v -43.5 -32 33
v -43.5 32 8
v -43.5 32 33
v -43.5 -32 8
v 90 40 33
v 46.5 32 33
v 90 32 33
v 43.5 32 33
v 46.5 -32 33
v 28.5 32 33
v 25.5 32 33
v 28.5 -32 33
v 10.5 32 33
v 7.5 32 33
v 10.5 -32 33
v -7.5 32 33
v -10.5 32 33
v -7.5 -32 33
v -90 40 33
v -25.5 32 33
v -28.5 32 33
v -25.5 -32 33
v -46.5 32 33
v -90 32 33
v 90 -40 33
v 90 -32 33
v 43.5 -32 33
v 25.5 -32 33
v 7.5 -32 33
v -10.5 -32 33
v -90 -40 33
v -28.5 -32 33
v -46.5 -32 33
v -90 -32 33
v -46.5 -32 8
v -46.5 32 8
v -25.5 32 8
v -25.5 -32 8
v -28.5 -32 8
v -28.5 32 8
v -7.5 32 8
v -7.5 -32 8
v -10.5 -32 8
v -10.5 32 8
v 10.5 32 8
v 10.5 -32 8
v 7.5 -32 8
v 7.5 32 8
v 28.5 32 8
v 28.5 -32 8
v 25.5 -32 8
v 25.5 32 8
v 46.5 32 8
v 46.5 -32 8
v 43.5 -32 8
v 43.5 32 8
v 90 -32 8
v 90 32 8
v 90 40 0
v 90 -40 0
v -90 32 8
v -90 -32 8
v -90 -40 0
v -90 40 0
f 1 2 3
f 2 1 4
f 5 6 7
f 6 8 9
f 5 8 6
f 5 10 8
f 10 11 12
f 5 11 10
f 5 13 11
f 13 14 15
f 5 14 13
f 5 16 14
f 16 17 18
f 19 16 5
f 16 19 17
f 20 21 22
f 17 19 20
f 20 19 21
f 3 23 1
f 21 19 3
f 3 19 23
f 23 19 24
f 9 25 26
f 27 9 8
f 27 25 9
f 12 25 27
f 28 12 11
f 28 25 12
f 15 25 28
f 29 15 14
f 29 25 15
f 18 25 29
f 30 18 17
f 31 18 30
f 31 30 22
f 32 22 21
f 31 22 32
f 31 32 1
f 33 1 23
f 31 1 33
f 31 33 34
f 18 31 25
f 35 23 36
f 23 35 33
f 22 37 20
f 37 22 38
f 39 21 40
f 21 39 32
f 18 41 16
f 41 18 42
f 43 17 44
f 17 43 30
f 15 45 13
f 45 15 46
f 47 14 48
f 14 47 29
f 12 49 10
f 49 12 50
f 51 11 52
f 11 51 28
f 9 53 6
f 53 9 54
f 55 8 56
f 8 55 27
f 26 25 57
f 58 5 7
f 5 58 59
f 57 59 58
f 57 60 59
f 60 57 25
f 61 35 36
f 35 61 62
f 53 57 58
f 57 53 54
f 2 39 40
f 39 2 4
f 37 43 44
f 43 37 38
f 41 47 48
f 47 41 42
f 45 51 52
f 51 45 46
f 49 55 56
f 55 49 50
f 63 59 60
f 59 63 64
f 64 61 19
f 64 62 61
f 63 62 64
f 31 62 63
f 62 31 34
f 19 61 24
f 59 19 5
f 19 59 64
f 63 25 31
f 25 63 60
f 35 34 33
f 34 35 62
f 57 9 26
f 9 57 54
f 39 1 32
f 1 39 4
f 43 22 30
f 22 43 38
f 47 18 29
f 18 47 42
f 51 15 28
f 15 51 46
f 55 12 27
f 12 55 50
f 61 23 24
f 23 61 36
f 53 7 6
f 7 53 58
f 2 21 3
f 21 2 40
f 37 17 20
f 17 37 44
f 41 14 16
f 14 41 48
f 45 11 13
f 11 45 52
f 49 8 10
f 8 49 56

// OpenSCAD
$fn = 32;

// ----------------------------------------------------------------------
// Rib frame 180 x 80 x 33
// 6 ribs at 18 mm pitch
// ----------------------------------------------------------------------

// --- parameters (mm) ---
frame = [180, 80, 8];  // base plate size (x, y, z)
rail_w = 8;            // side rail width
ribs = 6;              // number of ribs
rib_t = 3;             // rib thickness
rib_h = 25;            // rib height above the base plate
pitch = 18;            // pitch between rib centres

// --- derived feature positions (mm) ---
span = (ribs - 1) * pitch;          // = 90   distance between the outer ribs
origin_x = -span / 2;               // = -45   X of the first rib
rib_len = frame[1] - 2 * rail_w + 2;  // = 66   rib length, 1 mm into each rail
feature_centers = [
  [origin_x + 0 * pitch, 0],
  [origin_x + 1 * pitch, 0],
  [origin_x + 2 * pitch, 0],
  [origin_x + 3 * pitch, 0],
  [origin_x + 4 * pitch, 0],
  [origin_x + 5 * pitch, 0]
];   // rib centre line, drives the rib loop

// base plate, two side rails, then the ribs read straight off feature_centers
union() {
  translate([-frame[0] / 2, -frame[1] / 2, 0]) cube(frame);
  translate([-frame[0] / 2, -frame[1] / 2, 0]) cube([frame[0], rail_w, frame[2] + rib_h]);
  translate([-frame[0] / 2, frame[1] / 2 - rail_w, 0]) cube([frame[0], rail_w, frame[2] + rib_h]);
  for (centre = feature_centers)
    translate([centre[0] - rib_t / 2, centre[1] - rib_len / 2, frame[2] - 1])
      cube([rib_t, rib_len, rib_h + 1]);
}
